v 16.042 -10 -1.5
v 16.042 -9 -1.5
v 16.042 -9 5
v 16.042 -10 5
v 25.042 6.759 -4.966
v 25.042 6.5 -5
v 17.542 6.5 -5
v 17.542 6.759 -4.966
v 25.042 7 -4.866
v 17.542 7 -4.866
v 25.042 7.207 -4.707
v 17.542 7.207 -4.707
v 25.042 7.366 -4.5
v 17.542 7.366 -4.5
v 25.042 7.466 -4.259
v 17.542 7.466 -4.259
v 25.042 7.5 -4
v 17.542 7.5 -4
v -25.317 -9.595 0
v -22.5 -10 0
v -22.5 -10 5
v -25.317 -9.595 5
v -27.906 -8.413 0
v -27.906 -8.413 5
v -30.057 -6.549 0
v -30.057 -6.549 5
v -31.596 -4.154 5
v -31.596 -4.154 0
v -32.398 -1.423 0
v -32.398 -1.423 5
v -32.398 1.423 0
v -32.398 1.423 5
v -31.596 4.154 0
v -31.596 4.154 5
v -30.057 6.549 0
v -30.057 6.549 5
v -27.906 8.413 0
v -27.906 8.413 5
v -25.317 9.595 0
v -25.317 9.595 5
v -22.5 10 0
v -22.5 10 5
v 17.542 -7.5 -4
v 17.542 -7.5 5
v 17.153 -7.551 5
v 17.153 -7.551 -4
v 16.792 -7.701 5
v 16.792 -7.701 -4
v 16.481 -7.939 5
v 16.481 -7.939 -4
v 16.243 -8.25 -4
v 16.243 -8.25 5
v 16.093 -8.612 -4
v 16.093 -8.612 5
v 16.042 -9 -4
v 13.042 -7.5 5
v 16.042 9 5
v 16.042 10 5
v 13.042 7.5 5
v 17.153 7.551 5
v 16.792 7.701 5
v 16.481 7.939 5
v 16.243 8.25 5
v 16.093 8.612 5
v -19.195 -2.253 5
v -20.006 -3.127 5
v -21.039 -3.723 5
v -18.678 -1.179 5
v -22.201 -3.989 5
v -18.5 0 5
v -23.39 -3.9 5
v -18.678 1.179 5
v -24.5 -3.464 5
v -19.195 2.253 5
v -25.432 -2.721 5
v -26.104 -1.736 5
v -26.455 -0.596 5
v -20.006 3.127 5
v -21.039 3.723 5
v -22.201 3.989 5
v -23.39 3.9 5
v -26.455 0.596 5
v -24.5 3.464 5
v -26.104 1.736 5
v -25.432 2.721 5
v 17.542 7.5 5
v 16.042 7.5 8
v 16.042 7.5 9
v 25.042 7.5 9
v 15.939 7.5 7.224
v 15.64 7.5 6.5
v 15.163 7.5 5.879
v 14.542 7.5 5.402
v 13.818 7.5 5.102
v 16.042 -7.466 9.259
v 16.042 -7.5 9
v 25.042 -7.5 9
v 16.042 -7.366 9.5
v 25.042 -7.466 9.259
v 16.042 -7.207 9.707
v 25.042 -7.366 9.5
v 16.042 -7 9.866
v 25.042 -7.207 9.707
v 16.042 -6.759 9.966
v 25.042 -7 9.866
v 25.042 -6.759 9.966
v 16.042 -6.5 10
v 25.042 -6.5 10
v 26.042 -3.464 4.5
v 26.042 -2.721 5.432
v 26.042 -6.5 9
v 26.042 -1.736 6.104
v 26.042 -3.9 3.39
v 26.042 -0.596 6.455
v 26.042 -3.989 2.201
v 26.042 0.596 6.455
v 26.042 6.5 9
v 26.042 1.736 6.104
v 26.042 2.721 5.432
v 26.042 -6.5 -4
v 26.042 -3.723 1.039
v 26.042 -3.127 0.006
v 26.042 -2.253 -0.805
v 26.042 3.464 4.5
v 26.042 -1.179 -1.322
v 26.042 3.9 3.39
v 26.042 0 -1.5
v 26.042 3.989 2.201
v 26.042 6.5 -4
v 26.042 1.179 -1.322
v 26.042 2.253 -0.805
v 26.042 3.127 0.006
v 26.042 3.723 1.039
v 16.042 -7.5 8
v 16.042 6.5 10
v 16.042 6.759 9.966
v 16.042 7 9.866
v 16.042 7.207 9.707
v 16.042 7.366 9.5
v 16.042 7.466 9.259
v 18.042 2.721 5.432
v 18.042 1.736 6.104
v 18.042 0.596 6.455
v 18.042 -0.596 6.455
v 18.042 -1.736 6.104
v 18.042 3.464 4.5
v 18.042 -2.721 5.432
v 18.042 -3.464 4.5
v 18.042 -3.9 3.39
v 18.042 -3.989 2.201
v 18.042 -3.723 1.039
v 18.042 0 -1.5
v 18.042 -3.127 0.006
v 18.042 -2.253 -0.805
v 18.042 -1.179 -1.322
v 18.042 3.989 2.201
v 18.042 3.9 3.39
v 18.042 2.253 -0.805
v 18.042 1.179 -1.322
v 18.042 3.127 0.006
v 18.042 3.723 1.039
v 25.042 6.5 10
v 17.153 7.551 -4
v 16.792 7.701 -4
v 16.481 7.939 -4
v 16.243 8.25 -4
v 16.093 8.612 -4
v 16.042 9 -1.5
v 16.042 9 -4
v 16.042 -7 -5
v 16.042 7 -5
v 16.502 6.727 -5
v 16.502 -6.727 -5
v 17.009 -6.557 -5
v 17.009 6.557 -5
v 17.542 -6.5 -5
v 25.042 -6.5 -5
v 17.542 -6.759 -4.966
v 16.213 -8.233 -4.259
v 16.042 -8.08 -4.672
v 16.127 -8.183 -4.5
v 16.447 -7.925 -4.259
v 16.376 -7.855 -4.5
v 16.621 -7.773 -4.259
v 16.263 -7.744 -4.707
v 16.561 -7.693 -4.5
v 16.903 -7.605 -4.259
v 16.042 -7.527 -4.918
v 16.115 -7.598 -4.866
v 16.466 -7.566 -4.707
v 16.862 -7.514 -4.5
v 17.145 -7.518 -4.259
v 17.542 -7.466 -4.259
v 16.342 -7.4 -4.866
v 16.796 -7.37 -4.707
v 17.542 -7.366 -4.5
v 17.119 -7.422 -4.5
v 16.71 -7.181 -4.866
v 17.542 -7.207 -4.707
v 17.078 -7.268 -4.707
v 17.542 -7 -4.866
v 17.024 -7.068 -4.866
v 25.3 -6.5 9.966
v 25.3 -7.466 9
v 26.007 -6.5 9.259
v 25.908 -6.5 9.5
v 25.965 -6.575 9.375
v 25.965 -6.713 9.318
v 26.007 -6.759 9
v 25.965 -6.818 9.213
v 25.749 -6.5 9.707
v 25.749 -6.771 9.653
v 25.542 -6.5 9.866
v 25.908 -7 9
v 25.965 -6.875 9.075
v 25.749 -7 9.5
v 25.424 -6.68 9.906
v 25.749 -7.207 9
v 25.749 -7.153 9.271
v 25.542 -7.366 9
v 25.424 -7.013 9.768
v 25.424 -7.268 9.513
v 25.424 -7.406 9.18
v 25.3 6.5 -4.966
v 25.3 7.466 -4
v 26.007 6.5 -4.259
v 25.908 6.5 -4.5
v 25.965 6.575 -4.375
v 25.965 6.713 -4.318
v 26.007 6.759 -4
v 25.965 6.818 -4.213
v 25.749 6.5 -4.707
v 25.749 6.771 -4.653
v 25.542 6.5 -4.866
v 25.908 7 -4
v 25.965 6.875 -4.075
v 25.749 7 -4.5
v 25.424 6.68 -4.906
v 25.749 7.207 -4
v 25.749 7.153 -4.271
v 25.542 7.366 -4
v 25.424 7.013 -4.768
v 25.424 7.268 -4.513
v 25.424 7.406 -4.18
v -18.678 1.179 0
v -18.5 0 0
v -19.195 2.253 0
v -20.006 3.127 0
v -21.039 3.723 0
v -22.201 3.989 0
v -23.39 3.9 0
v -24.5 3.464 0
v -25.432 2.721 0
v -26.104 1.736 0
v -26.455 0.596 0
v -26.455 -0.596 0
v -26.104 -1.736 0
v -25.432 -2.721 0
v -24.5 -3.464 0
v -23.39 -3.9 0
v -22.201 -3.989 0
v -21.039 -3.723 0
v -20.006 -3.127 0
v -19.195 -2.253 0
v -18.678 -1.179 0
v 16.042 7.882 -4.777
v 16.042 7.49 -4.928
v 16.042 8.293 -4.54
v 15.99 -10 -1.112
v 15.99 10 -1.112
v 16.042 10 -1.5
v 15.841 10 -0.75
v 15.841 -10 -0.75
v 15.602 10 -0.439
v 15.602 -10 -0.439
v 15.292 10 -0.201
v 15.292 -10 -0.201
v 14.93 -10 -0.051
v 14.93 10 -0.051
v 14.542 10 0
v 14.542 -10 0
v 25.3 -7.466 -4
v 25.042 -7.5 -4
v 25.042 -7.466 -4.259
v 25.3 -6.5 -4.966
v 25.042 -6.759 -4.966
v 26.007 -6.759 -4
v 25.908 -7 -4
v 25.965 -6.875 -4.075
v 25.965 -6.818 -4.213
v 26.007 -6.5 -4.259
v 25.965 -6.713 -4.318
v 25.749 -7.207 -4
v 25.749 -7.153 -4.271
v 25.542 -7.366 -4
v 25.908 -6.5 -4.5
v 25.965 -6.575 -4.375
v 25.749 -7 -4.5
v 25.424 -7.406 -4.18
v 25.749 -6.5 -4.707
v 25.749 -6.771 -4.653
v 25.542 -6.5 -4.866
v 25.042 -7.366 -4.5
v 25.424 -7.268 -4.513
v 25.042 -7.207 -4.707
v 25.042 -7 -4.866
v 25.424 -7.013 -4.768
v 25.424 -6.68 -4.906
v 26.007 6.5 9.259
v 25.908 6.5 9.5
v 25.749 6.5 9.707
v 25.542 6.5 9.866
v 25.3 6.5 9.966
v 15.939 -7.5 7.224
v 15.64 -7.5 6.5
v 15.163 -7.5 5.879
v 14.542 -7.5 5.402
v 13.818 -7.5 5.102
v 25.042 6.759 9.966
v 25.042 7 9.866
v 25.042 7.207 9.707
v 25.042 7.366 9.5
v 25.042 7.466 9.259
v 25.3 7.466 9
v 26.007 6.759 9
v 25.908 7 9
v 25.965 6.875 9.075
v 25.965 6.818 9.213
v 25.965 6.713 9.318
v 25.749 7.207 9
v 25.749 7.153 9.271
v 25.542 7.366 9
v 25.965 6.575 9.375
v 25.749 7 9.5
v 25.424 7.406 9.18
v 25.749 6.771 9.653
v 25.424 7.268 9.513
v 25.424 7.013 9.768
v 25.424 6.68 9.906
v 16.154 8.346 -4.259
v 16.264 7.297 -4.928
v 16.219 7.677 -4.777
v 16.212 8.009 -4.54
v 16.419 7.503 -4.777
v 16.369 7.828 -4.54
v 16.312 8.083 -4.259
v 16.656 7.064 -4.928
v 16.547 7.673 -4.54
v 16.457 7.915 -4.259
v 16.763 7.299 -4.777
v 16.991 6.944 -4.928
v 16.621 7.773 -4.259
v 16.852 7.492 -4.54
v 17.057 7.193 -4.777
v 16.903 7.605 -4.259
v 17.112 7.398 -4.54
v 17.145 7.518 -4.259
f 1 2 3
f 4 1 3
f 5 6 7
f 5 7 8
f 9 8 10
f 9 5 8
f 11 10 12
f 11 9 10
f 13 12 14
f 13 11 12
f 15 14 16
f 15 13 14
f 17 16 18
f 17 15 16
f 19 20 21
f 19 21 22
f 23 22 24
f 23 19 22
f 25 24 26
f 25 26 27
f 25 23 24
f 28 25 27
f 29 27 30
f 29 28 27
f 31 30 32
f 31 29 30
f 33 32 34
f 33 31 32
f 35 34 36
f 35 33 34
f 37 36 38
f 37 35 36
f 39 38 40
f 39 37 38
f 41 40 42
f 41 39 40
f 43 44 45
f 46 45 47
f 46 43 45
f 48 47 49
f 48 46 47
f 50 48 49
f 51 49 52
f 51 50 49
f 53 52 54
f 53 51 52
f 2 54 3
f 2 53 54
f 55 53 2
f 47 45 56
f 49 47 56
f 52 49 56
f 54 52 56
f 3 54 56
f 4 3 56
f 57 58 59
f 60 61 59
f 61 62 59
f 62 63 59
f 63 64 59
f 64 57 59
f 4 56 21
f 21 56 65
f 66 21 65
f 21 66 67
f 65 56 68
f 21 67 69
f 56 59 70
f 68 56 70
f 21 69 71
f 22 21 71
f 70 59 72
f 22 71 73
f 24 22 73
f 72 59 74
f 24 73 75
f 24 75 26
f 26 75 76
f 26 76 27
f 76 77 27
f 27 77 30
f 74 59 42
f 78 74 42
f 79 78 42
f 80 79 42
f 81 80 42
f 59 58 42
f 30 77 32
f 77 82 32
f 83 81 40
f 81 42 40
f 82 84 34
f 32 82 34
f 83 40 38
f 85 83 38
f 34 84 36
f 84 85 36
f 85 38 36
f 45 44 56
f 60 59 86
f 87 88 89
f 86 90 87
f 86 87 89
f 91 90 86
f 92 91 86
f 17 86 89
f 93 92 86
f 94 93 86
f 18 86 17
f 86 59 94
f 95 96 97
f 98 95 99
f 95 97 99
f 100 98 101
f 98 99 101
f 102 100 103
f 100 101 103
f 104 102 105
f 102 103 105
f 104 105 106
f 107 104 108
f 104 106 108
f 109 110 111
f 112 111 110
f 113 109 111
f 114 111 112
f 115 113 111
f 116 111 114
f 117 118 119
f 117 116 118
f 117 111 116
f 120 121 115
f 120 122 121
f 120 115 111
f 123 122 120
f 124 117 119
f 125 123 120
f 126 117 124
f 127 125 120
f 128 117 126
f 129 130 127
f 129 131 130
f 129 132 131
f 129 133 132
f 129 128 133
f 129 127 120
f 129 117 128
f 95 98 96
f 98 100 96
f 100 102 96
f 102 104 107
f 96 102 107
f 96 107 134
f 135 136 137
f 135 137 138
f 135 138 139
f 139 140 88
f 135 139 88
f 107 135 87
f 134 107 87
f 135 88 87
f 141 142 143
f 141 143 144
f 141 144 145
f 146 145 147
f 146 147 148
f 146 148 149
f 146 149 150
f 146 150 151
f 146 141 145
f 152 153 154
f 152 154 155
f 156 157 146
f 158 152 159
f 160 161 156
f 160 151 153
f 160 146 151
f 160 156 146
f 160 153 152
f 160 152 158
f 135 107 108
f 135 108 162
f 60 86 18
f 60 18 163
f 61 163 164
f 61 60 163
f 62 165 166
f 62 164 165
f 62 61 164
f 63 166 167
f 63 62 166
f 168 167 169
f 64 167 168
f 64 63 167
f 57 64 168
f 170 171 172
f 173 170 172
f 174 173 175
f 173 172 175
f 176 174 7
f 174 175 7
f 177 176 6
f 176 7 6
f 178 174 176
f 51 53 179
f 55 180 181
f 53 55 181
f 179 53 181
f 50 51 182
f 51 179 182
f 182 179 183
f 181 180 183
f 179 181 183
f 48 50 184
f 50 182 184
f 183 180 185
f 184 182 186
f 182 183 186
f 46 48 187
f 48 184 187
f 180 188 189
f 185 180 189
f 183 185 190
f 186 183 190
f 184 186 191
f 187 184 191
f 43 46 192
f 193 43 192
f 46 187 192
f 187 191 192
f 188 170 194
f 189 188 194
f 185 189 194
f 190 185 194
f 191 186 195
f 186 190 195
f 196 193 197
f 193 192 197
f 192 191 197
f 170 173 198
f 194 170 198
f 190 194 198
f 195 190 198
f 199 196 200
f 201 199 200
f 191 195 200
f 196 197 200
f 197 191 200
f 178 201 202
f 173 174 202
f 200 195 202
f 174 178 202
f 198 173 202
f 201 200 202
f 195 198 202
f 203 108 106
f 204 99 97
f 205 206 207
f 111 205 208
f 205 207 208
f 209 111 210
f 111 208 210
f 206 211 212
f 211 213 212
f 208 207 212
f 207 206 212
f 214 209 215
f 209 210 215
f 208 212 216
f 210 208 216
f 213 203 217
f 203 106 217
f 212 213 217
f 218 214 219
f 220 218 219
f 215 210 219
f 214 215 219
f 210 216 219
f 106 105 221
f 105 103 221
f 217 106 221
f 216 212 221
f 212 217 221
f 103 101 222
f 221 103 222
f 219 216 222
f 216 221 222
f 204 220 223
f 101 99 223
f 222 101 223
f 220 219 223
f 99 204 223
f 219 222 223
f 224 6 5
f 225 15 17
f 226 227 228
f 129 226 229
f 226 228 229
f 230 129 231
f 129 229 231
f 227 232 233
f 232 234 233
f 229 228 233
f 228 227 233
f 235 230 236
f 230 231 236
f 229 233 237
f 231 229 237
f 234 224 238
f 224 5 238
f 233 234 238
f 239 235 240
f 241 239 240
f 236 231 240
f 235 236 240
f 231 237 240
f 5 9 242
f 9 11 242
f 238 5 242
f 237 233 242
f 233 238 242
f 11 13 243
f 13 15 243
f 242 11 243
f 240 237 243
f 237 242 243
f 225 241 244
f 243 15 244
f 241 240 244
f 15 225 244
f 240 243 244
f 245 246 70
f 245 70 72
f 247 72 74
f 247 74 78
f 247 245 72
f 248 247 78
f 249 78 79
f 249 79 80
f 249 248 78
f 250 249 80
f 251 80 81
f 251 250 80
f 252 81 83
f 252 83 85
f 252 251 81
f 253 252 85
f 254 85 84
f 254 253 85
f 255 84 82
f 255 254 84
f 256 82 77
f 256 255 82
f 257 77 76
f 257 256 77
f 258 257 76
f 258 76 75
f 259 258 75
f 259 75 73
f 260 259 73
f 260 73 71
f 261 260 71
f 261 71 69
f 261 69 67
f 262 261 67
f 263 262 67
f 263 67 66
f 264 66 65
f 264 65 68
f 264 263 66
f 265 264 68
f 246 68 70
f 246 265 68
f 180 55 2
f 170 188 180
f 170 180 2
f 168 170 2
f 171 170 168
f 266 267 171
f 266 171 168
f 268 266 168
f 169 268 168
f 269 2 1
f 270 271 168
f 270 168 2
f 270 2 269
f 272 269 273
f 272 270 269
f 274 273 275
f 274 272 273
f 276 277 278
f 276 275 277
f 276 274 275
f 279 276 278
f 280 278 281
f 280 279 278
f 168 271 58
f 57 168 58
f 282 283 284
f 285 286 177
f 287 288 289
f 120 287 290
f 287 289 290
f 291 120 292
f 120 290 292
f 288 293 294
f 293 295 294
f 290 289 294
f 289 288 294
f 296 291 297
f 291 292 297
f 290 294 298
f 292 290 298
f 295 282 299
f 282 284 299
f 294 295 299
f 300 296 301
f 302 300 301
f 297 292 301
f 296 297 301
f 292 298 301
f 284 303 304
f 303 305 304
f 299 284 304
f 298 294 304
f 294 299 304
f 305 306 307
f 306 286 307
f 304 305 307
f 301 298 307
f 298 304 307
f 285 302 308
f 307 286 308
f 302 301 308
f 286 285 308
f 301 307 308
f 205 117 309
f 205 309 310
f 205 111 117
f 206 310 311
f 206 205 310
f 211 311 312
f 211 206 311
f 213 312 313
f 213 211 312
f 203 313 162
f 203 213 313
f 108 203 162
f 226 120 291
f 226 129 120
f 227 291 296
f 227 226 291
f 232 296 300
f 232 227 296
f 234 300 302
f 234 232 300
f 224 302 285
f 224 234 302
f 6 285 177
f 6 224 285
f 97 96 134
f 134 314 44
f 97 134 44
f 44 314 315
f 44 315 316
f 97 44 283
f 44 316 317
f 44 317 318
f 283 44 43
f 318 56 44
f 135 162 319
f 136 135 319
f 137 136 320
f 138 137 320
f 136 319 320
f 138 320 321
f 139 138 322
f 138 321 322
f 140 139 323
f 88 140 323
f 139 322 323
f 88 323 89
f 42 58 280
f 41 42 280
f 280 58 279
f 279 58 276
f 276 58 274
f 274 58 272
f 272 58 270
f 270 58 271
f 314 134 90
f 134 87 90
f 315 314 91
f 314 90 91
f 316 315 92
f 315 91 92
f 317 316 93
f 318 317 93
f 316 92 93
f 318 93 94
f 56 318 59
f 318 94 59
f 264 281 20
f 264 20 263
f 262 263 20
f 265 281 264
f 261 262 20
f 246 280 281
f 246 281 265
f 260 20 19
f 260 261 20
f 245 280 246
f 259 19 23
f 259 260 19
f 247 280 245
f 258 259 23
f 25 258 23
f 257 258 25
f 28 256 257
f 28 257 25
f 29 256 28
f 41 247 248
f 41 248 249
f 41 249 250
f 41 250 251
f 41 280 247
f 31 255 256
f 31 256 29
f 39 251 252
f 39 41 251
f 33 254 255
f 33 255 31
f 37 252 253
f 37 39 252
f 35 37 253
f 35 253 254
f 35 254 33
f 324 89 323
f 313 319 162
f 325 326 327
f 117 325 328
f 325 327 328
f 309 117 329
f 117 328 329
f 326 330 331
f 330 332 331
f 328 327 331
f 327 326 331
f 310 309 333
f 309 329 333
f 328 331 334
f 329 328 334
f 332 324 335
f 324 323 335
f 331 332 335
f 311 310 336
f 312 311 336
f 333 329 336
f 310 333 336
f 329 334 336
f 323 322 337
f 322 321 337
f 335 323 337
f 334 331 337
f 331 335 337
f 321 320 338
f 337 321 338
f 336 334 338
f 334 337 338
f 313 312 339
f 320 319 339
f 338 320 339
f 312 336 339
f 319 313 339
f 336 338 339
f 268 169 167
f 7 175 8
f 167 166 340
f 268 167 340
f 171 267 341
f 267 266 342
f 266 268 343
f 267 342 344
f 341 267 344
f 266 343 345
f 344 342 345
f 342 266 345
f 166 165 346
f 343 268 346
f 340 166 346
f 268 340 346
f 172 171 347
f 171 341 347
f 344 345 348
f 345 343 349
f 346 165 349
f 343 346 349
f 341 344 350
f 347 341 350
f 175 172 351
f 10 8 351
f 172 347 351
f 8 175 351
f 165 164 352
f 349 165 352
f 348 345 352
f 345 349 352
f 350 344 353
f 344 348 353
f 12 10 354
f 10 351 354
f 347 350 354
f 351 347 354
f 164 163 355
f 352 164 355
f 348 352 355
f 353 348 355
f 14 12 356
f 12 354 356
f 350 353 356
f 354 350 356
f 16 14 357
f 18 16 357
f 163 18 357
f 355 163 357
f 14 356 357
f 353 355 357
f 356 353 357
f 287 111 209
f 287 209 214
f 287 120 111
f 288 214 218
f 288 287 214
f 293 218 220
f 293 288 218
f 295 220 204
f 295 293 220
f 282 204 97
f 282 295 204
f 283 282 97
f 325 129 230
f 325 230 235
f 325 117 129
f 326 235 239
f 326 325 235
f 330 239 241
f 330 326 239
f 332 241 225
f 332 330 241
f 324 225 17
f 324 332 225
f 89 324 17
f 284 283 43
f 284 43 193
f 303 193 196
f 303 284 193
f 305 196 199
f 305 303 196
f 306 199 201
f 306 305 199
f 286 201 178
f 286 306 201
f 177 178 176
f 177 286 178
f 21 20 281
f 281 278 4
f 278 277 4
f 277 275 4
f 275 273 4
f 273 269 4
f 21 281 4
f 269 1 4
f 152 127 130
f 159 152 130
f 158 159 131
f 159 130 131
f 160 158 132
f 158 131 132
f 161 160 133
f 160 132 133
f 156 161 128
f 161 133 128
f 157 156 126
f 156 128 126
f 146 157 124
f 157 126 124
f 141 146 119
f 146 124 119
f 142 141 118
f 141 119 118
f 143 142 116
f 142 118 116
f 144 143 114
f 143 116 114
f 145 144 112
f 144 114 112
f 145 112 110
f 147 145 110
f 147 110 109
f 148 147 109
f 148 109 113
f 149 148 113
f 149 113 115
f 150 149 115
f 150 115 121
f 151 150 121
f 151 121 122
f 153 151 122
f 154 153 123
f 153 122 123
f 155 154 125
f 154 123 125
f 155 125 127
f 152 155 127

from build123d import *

# Parameters (mm, degrees)
SKETCH1_R           = 4
BOSS_EXTRUDE1_DEPTH = 5
SKETCH2_W           = 25.16319253
SKETCH2_H           = 20
CUT_EXTRUDE1_DEPTH  = 35.369317712
SKETCH3_W           = 15
SKETCH3_H           = 15
BOSS_EXTRUDE2_DEPTH = 10
FILLET1_R           = 1.5
FILLET2_R           = 3
SKETCH4_R           = 4
CUT_EXTRUDE2_DEPTH  = 8
FILLET3_R           = 1
FILLET4_R           = 1


with BuildPart() as part:
    # Sketch1 → Boss-Extrude1 (new body)
    with BuildSketch(Plane.XY):
        with BuildLine():
            Line((-22.5, 10), (22.5, 10))
            ThreePointArc((22.5, 10), (32.5, 0), (22.5, -10))
            Line((22.5, -10), (-22.5, -10))
            ThreePointArc((-22.5, -10), (-32.5, 0), (-22.5, 10))
        make_face()
        with Locations((-22.5, 0)):
            Circle(SKETCH1_R, mode=Mode.SUBTRACT)
        with Locations((22.5, 0)):
            Circle(SKETCH1_R, mode=Mode.SUBTRACT)
    extrude(amount=BOSS_EXTRUDE1_DEPTH)

    # Sketch2 → Cut-Extrude1 (cut, through all)
    with BuildSketch(Plane.XY.offset(5)):
        with Locations((28.623168012, 0)):
            Rectangle(SKETCH2_W, SKETCH2_H)
    extrude(amount=-CUT_EXTRUDE1_DEPTH, mode=Mode.SUBTRACT)

    # Sketch3 → Boss-Extrude2 (add)
    with BuildSketch(Plane(origin=(16.041571747, 0, 0), x_dir=(0, 0, -1), z_dir=(1, 0, 0))):
        with Locations((-2.5, 0)):
            Rectangle(SKETCH3_W, SKETCH3_H)
    extrude(amount=BOSS_EXTRUDE2_DEPTH)

    # Fillet1
    # the kernel refuses this fillet: 1.5 mm, written as the material it adds along each edge
    with BuildSketch(Plane(origin=(16.041571747, 11.25, 0), x_dir=(-1, 0, 0), z_dir=(0, -1, 0))) as fillet1_piece_1_section:
        with BuildLine():
            CenterArc((FILLET1_R, FILLET1_R), FILLET1_R, 180, 90)
            Line((0, FILLET1_R), (0, 0))
            Line((0, 0), (FILLET1_R, 0))
        make_face()
    fillet1_piece_1 = extrude(amount=22.5, mode=Mode.PRIVATE)
    fillet1_piece_1 = split(fillet1_piece_1, bisect_by=Plane(origin=(16.041571747, 10, 0), z_dir=(0, -1, 0)), keep=Keep.TOP, mode=Mode.PRIVATE)
    fillet1_piece_1 = split(fillet1_piece_1, bisect_by=Plane(origin=(16.041571747, -10, 0), z_dir=(0, 1, 0)), keep=Keep.TOP, mode=Mode.PRIVATE)
    add(fillet1_piece_1)
    # the kernel refuses this fillet: 1.5 mm, written as the material it adds along each edge
    with BuildSketch(Plane(origin=(16.041571747, 7.5, 5), x_dir=(1, 0, 0), z_dir=(0, 0, -1))) as fillet1_2_piece_1_section:
        with BuildLine():
            CenterArc((FILLET1_R, -FILLET1_R), FILLET1_R, 90, 90)
            Line((0, -FILLET1_R), (0, 0))
            Line((0, 0), (FILLET1_R, 0))
        make_face()
    fillet1_2_piece_1 = extrude(amount=10.25, mode=Mode.PRIVATE)
    fillet1_2_piece_1 = split(fillet1_2_piece_1, bisect_by=Plane(origin=(16.041571747, 7.5, -5), z_dir=(0, 0, 1)), keep=Keep.TOP, mode=Mode.PRIVATE)
    add(fillet1_2_piece_1)
    # the kernel refuses this fillet: 1.5 mm, written as the material it adds along each edge
    with BuildSketch(Plane(origin=(16.041571747, -7.5, -5.25), x_dir=(1, 0, 0), z_dir=(0, 0, 1))) as fillet1_3_piece_1_section:
        with BuildLine():
            CenterArc((FILLET1_R, -FILLET1_R), FILLET1_R, 90, 90)
            Line((0, -FILLET1_R), (0, 0))
            Line((0, 0), (FILLET1_R, 0))
        make_face()
    fillet1_3_piece_1 = extrude(amount=10.25, mode=Mode.PRIVATE)
    fillet1_3_piece_1 = split(fillet1_3_piece_1, bisect_by=Plane(origin=(16.041571747, -7.5, -5), z_dir=(0, 0, 1)), keep=Keep.TOP, mode=Mode.PRIVATE)
    add(fillet1_3_piece_1)

    # Fillet2
    fillet2_edges = [part.edges().sort_by_distance(p)[0] for p in [
        (16.041571747, 0, 5),
    ]]
    fillet(fillet2_edges, radius=FILLET2_R)

    # Sketch4 → Cut-Extrude2 (cut)
    with BuildSketch(Plane(origin=(26.041571747, 0, 0), x_dir=(0, 0, -1), z_dir=(1, 0, 0))):
        with Locations((-2.5, 0)):
            Circle(SKETCH4_R)
    extrude(amount=-CUT_EXTRUDE2_DEPTH, mode=Mode.SUBTRACT)

    # Fillet3
    fillet3_edges = [part.edges().sort_by_distance(p)[0] for p in [
        (21.791571747, -7.5, -5),
        (21.791571747, 7.5, -5),
        (21.041571747, 7.5, 10),
        (21.041571747, -7.5, 10),
        (16.480911575, 7.939339828, -5),
        (16.480911575, -7.939339828, -5),
    ]]
    fillet(fillet3_edges, radius=FILLET3_R)

    # Fillet4
    fillet4_edges = [part.edges().sort_by_distance(p)[0] for p in [
        (26.041571747, 0, -5),
        (26.041571747, -7.5, 2.5),
        (26.041571747, 7.5, 2.5),
        (26.041571747, 0, 10),
        (26.041571747, 7.207106781, -4.707106781),
        (26.041571747, 7.207106781, 9.707106781),
        (26.041571747, -7.207106781, 9.707106781),
        (26.041571747, -7.207106781, -4.707106781),
    ]]
    fillet(fillet4_edges, radius=FILLET4_R)


solid = part.part
